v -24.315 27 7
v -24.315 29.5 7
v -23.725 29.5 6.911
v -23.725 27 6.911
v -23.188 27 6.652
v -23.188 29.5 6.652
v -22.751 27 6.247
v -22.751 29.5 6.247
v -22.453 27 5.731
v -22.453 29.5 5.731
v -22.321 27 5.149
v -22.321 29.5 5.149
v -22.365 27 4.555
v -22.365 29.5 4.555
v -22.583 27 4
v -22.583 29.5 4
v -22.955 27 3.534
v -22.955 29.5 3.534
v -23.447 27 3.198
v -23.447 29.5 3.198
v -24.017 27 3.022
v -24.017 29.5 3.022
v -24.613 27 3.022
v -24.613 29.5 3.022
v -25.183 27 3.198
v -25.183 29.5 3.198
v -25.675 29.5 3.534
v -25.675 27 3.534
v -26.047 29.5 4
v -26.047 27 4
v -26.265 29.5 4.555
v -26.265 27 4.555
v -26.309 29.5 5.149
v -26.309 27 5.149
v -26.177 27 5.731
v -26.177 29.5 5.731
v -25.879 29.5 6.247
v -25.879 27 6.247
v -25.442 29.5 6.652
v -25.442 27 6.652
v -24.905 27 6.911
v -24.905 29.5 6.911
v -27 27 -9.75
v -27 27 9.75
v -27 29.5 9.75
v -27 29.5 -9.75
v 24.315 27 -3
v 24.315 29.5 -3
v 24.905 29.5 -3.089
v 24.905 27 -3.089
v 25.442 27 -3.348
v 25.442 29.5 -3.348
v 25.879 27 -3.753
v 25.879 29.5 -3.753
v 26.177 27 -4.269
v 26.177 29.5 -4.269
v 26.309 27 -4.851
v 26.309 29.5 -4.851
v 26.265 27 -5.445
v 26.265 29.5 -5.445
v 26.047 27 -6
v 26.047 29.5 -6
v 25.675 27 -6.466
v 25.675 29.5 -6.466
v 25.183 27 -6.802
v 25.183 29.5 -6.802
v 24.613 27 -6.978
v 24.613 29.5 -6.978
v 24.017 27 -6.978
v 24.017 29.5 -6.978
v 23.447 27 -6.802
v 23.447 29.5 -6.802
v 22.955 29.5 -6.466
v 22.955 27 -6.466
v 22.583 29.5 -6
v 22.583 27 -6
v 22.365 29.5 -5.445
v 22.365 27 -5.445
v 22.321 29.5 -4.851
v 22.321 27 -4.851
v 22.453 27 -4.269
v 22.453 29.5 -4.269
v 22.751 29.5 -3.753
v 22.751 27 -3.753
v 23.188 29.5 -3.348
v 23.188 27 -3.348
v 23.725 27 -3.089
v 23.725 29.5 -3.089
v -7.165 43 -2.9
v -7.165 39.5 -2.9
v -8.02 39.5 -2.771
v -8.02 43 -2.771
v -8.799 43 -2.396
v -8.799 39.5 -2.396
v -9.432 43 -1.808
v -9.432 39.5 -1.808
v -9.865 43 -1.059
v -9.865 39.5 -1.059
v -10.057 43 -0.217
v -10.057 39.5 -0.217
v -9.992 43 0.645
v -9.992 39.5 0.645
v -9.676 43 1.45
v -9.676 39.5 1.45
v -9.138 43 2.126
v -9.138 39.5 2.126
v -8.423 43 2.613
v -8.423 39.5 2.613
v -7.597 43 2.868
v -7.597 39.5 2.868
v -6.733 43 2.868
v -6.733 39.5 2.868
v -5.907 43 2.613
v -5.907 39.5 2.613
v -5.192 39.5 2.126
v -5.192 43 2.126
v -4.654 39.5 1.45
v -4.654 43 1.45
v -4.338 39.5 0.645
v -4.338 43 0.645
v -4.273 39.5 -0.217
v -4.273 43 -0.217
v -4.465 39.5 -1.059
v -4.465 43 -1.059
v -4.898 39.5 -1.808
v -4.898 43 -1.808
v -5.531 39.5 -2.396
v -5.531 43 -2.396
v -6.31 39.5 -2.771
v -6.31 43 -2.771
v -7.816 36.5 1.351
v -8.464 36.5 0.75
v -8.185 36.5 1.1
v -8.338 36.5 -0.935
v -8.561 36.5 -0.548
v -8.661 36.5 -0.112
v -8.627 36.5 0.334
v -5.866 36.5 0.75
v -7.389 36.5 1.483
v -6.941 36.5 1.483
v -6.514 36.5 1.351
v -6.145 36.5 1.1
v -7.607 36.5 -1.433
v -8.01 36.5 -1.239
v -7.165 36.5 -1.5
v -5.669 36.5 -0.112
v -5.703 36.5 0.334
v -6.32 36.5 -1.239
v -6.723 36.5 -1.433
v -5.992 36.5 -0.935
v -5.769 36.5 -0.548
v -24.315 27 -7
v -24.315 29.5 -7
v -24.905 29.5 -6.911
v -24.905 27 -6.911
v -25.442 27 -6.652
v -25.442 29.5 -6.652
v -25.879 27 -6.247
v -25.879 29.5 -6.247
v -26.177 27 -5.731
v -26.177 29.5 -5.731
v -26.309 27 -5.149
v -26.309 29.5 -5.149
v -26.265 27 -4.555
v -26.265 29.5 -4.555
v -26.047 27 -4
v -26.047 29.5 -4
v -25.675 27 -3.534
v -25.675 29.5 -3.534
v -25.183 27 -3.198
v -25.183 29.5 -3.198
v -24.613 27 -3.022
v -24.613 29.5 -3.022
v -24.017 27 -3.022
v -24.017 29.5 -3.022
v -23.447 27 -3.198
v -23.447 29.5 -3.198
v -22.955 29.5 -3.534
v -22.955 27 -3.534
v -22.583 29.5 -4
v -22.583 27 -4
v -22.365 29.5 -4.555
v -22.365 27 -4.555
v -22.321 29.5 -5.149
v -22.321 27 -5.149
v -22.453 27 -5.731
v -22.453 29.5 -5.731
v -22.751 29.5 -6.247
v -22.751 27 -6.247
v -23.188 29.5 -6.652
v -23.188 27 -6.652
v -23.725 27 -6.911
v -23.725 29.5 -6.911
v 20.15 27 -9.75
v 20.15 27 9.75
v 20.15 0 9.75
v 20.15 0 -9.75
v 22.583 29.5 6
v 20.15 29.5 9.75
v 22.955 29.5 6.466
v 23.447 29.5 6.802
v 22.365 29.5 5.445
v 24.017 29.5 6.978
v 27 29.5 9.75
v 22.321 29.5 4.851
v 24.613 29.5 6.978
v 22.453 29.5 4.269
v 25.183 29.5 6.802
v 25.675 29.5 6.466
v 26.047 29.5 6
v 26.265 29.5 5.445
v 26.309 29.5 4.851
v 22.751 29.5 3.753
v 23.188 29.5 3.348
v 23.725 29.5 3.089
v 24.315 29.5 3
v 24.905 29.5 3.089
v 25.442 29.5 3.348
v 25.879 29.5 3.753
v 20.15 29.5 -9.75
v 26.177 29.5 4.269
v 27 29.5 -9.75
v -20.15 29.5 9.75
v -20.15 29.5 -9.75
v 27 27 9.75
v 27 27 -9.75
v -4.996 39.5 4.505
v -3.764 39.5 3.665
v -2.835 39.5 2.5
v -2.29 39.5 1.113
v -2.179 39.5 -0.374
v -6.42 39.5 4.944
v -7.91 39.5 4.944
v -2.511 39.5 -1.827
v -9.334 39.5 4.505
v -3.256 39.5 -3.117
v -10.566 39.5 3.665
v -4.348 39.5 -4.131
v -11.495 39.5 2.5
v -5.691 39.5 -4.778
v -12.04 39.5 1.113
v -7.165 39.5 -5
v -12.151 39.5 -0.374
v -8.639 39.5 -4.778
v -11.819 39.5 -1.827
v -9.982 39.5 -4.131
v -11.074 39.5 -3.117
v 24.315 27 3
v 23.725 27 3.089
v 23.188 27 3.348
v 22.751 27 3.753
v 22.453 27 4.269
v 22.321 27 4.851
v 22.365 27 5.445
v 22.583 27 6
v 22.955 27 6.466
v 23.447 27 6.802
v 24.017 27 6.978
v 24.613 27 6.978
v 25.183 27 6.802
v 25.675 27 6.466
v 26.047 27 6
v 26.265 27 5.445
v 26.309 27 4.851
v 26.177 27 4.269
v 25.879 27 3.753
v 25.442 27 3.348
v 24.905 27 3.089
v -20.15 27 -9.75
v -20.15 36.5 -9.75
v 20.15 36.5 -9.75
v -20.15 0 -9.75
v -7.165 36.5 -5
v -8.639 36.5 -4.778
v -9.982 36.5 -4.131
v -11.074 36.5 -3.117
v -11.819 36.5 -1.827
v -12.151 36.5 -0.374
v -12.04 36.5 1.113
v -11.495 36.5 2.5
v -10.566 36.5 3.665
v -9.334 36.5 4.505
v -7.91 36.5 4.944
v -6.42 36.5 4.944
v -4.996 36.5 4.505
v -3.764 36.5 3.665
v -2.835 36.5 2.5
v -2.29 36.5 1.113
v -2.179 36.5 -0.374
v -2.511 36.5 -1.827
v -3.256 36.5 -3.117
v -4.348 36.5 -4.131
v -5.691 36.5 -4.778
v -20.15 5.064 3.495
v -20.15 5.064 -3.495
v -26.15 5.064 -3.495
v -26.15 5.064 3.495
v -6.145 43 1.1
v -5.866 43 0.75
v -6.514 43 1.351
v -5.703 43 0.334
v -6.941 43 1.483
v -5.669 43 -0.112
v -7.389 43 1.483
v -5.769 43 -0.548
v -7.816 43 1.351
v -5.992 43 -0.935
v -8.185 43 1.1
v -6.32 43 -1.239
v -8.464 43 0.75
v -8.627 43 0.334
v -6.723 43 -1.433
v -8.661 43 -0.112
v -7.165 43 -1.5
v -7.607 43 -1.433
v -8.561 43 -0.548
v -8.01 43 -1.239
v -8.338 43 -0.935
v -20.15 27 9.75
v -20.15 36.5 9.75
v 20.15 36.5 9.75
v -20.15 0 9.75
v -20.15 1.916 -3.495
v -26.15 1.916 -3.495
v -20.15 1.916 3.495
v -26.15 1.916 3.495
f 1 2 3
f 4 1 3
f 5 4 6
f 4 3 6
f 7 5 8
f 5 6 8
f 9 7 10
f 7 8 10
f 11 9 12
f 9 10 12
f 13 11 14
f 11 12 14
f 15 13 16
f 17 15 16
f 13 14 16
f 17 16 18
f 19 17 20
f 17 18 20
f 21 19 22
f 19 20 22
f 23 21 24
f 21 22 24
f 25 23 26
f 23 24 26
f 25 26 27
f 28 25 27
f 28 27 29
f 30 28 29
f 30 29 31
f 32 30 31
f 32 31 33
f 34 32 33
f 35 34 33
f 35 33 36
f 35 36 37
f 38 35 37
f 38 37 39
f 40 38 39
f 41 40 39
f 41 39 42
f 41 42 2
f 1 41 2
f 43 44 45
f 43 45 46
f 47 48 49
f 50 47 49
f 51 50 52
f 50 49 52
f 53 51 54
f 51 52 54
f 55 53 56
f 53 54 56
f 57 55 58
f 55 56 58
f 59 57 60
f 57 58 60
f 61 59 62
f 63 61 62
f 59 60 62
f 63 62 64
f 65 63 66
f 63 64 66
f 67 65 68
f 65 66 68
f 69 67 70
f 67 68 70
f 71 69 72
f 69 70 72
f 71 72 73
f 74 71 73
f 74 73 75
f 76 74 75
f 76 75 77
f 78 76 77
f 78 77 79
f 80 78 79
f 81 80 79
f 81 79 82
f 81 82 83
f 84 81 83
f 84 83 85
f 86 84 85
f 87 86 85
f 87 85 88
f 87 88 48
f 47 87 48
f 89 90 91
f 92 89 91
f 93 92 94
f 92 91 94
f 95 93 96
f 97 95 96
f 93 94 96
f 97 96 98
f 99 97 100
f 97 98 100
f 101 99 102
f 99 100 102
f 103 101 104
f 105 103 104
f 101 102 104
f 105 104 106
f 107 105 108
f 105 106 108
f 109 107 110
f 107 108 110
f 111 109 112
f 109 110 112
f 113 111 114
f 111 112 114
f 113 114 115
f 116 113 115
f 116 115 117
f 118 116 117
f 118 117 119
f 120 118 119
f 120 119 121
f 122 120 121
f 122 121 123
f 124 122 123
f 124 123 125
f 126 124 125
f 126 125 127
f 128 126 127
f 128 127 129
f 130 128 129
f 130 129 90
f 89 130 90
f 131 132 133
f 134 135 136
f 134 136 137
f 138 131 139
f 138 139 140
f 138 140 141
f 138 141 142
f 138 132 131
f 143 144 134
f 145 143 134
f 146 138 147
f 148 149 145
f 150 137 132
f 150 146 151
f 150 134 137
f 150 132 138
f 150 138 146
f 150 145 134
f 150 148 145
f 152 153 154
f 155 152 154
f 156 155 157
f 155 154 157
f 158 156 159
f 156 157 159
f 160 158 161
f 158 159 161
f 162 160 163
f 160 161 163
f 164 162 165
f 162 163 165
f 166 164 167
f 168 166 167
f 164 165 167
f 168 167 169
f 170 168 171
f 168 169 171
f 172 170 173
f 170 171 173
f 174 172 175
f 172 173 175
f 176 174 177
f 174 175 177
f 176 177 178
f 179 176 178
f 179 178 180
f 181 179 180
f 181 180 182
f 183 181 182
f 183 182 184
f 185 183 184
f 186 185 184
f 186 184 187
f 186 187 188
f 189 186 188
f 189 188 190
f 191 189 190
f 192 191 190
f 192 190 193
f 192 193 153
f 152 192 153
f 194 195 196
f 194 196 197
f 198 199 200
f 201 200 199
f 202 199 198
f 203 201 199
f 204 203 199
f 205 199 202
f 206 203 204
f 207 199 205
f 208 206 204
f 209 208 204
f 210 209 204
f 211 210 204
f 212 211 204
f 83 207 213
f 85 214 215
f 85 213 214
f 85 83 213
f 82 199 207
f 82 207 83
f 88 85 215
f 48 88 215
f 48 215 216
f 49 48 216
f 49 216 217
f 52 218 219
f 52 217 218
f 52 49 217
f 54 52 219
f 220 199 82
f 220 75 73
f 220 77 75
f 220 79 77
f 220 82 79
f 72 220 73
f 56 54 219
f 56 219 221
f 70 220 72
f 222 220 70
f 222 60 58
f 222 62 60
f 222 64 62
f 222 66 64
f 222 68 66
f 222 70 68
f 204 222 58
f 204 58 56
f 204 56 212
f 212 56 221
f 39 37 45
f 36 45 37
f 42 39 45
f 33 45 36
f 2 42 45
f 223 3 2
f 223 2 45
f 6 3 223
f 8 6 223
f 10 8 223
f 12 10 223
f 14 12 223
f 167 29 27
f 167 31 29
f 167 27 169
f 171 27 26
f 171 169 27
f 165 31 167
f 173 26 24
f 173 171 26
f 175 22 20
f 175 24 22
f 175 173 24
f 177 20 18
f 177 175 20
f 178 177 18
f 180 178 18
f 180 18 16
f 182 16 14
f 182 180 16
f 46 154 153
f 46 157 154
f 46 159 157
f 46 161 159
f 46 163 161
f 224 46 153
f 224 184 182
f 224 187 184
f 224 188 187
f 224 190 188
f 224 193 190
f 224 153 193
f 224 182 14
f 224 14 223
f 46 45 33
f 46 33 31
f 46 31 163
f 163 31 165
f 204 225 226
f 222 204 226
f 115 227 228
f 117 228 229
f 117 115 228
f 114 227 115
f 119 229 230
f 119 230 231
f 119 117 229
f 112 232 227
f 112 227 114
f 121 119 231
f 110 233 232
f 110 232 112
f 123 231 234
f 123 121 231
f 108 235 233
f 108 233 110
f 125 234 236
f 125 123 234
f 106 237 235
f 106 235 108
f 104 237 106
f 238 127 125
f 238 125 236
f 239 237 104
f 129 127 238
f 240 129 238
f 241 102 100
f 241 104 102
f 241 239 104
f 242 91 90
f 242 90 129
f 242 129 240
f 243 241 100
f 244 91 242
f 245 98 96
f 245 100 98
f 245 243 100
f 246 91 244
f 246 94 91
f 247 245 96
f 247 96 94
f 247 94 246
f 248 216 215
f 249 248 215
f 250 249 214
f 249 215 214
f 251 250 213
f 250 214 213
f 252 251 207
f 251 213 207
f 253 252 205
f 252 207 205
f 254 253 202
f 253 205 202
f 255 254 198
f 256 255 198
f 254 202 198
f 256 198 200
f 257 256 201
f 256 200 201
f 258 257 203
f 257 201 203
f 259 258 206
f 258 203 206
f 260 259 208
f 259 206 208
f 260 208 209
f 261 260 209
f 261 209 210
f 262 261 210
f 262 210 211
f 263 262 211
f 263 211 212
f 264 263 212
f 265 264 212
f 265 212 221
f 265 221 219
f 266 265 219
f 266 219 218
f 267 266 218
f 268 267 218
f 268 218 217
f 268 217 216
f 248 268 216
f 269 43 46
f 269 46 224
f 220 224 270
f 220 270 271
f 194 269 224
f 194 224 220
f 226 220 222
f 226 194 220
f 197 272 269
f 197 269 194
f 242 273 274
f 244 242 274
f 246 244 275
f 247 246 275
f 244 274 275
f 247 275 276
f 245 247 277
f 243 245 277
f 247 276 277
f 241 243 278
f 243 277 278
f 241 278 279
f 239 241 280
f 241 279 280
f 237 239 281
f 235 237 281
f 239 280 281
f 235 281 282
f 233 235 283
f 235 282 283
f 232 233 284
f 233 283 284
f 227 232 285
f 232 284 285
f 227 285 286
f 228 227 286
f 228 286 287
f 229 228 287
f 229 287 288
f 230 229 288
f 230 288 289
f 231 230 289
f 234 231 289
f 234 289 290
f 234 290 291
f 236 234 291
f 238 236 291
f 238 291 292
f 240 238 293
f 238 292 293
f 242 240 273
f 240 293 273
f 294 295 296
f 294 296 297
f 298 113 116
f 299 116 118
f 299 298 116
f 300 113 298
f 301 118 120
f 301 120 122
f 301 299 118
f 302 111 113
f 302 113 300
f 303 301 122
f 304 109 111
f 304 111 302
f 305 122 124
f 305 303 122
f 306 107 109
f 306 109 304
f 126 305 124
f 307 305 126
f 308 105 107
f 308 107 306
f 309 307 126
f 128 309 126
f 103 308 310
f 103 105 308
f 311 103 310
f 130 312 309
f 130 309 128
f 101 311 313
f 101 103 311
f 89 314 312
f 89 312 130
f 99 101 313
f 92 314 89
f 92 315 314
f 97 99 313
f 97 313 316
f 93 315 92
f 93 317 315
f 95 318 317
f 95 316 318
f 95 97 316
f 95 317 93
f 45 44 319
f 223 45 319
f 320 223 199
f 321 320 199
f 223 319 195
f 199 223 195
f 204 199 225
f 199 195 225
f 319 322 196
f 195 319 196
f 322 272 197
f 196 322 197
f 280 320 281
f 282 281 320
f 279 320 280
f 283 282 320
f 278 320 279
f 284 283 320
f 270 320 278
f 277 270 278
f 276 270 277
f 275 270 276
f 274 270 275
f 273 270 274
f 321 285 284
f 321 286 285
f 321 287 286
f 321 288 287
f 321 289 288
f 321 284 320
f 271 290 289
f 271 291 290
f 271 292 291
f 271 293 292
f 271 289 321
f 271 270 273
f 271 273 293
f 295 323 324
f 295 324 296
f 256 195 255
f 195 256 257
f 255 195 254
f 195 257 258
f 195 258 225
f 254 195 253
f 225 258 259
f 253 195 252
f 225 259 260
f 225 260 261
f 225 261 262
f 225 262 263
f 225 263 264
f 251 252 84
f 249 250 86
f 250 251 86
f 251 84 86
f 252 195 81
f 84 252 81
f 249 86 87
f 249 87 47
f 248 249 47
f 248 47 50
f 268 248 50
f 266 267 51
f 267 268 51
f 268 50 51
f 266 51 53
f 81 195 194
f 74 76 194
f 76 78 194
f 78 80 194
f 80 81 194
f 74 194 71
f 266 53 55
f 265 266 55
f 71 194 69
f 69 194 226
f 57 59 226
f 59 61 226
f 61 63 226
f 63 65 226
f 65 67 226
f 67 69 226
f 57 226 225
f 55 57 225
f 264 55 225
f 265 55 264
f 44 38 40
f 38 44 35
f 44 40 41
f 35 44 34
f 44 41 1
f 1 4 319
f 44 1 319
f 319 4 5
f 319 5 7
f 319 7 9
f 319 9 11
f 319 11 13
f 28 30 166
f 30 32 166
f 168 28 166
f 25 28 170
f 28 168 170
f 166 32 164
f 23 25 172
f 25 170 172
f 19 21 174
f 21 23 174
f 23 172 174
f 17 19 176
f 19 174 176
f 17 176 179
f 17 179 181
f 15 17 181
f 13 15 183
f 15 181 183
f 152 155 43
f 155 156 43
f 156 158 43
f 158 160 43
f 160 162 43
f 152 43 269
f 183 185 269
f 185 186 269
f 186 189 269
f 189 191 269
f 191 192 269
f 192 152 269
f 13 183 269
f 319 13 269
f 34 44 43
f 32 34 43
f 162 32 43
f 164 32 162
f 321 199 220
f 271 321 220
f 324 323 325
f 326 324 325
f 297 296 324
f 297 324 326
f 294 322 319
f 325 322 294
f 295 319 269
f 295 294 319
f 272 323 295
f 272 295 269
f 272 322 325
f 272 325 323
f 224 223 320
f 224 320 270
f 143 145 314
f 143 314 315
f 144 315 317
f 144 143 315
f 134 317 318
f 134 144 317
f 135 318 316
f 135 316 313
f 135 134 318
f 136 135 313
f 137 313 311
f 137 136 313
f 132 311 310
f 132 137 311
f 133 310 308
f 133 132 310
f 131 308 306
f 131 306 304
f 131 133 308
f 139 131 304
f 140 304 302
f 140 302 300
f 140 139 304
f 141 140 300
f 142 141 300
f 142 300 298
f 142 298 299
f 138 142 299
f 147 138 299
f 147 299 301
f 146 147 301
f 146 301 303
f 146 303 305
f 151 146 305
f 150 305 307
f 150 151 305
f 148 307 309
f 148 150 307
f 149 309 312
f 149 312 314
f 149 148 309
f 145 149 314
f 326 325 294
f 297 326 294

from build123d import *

# Parameters (mm, degrees)
SKETCH_1_W          = 40.3
SKETCH_1_H          = 19.5
EXTRUDE_1_DEPTH     = 27
SKETCH_2_W          = 54
SKETCH_2_H          = 19.5
EXTRUDE_2_DEPTH     = 2.5
CUT_EXTRUDE_1_REACH = 43.162
SKETCH_3_R          = 2
SKETCH_4_W          = 40.3
SKETCH_4_H          = 19.5
EXTRUDE_3_DEPTH     = 7
SKETCH_6_R          = 2.9
SKETCH_6_R_2        = 1.5
EXTRUDE_4_DEPTH     = 6.5
SKETCH_7_R          = 5
SKETCH_7_R_2        = 2.9
EXTRUDE_5_DEPTH     = 3
SKETCH_8_W          = 6.989880398
SKETCH_8_H          = 3.148594774
EXTRUDE_6_DEPTH     = 6


with BuildPart() as part:
    # 草图1 → 凸台-拉伸1 (new body)
    with BuildSketch(Plane(origin=(0, 0, 0), x_dir=(1, 0, 0), z_dir=(0, 1, 0))):
        Rectangle(SKETCH_1_W, SKETCH_1_H)
    extrude(amount=EXTRUDE_1_DEPTH)

    # 草图2 → 凸台-拉伸2 (add)
    with BuildSketch(Plane(origin=(0, 27, 0), x_dir=(1, 0, 0), z_dir=(0, 1, 0))):
        Rectangle(SKETCH_2_W, SKETCH_2_H)
    extrude(amount=EXTRUDE_2_DEPTH)

    # 草图3 → 切除-拉伸1 (cut, up to next)
    with BuildSketch(Plane(origin=(0, 29.5, 0), x_dir=(1, 0, 0), z_dir=(0, 1, 0)), mode=Mode.PRIVATE) as cut_extrude_1_sk1:
        with Locations(Location((24.315, 5, 0), (0, 0, 270))):
            Circle(SKETCH_3_R)
    cut_extrude_1_tool1 = extrude(cut_extrude_1_sk1.sketch, amount=-CUT_EXTRUDE_1_REACH, mode=Mode.PRIVATE) & part.part
    # 草图3 → 切除-拉伸1 (cut, up to next)
    with BuildSketch(Plane(origin=(0, 29.5, 0), x_dir=(1, 0, 0), z_dir=(0, 1, 0)), mode=Mode.PRIVATE) as cut_extrude_1_sk2:
        with Locations(Location((-24.315, 5, 0), (0, 0, 90))):
            Circle(SKETCH_3_R)
    cut_extrude_1_tool2 = extrude(cut_extrude_1_sk2.sketch, amount=-CUT_EXTRUDE_1_REACH, mode=Mode.PRIVATE) & part.part
    # 草图3 → 切除-拉伸1 (cut, up to next)
    with BuildSketch(Plane(origin=(0, 29.5, 0), x_dir=(1, 0, 0), z_dir=(0, 1, 0)), mode=Mode.PRIVATE) as cut_extrude_1_sk3:
        with Locations(Location((24.315, -5, 0), (0, 0, 90))):
            Circle(SKETCH_3_R)
    cut_extrude_1_tool3 = extrude(cut_extrude_1_sk3.sketch, amount=-CUT_EXTRUDE_1_REACH, mode=Mode.PRIVATE) & part.part
    # 草图3 → 切除-拉伸1 (cut, up to next)
    with BuildSketch(Plane(origin=(0, 29.5, 0), x_dir=(1, 0, 0), z_dir=(0, 1, 0)), mode=Mode.PRIVATE) as cut_extrude_1_sk4:
        with Locations(Location((-24.315, -5, 0), (0, 0, 270))):
            Circle(SKETCH_3_R)
    cut_extrude_1_tool4 = extrude(cut_extrude_1_sk4.sketch, amount=-CUT_EXTRUDE_1_REACH, mode=Mode.PRIVATE) & part.part
    add(cut_extrude_1_tool1.solids().sort_by_distance((24.315, 29.5, -5))[0], mode=Mode.SUBTRACT)
    add(cut_extrude_1_tool2.solids().sort_by_distance((-24.315, 29.5, -5))[0], mode=Mode.SUBTRACT)
    add(cut_extrude_1_tool3.solids().sort_by_distance((24.315, 29.5, 5))[0], mode=Mode.SUBTRACT)
    add(cut_extrude_1_tool4.solids().sort_by_distance((-24.315, 29.5, 5))[0], mode=Mode.SUBTRACT)

    # 草图4 → 凸台-拉伸3 (add)
    with BuildSketch(Plane(origin=(0, 29.5, 0), x_dir=(1, 0, 0), z_dir=(0, 1, 0))):
        Rectangle(SKETCH_4_W, SKETCH_4_H)
    extrude(amount=EXTRUDE_3_DEPTH)

    # 草图6 → 凸台-拉伸4 (add)
    with BuildSketch(Plane(origin=(0, 36.5, 0), x_dir=(1, 0, 0), z_dir=(0, 1, 0))):
        with Locations(Location((-7.165, 0, 0), (0, 0, 90))):
            Circle(SKETCH_6_R)
        with Locations(Location((-7.165, 0, 0), (0, 0, 90))):
            Circle(SKETCH_6_R_2, mode=Mode.SUBTRACT)
    extrude(amount=EXTRUDE_4_DEPTH)

    # 草图7 → 凸台-拉伸5 (add)
    with BuildSketch(Plane(origin=(0, 36.5, 0), x_dir=(1, 0, 0), z_dir=(0, 1, 0))):
        with Locations(Location((-7.165, 0, 0), (0, 0, 90))):
            Circle(SKETCH_7_R)
        with Locations(Location((-7.165, 0, 0), (0, 0, 90))):
            Circle(SKETCH_7_R_2, mode=Mode.SUBTRACT)
    extrude(amount=EXTRUDE_5_DEPTH)

    # 草图8 → 凸台-拉伸6 (add)
    with BuildSketch(Plane.ZY.offset(20.15)):
        with Locations((0, 3.490037893)):
            Rectangle(SKETCH_8_W, SKETCH_8_H)
    extrude(amount=EXTRUDE_6_DEPTH)


solid = part.part
